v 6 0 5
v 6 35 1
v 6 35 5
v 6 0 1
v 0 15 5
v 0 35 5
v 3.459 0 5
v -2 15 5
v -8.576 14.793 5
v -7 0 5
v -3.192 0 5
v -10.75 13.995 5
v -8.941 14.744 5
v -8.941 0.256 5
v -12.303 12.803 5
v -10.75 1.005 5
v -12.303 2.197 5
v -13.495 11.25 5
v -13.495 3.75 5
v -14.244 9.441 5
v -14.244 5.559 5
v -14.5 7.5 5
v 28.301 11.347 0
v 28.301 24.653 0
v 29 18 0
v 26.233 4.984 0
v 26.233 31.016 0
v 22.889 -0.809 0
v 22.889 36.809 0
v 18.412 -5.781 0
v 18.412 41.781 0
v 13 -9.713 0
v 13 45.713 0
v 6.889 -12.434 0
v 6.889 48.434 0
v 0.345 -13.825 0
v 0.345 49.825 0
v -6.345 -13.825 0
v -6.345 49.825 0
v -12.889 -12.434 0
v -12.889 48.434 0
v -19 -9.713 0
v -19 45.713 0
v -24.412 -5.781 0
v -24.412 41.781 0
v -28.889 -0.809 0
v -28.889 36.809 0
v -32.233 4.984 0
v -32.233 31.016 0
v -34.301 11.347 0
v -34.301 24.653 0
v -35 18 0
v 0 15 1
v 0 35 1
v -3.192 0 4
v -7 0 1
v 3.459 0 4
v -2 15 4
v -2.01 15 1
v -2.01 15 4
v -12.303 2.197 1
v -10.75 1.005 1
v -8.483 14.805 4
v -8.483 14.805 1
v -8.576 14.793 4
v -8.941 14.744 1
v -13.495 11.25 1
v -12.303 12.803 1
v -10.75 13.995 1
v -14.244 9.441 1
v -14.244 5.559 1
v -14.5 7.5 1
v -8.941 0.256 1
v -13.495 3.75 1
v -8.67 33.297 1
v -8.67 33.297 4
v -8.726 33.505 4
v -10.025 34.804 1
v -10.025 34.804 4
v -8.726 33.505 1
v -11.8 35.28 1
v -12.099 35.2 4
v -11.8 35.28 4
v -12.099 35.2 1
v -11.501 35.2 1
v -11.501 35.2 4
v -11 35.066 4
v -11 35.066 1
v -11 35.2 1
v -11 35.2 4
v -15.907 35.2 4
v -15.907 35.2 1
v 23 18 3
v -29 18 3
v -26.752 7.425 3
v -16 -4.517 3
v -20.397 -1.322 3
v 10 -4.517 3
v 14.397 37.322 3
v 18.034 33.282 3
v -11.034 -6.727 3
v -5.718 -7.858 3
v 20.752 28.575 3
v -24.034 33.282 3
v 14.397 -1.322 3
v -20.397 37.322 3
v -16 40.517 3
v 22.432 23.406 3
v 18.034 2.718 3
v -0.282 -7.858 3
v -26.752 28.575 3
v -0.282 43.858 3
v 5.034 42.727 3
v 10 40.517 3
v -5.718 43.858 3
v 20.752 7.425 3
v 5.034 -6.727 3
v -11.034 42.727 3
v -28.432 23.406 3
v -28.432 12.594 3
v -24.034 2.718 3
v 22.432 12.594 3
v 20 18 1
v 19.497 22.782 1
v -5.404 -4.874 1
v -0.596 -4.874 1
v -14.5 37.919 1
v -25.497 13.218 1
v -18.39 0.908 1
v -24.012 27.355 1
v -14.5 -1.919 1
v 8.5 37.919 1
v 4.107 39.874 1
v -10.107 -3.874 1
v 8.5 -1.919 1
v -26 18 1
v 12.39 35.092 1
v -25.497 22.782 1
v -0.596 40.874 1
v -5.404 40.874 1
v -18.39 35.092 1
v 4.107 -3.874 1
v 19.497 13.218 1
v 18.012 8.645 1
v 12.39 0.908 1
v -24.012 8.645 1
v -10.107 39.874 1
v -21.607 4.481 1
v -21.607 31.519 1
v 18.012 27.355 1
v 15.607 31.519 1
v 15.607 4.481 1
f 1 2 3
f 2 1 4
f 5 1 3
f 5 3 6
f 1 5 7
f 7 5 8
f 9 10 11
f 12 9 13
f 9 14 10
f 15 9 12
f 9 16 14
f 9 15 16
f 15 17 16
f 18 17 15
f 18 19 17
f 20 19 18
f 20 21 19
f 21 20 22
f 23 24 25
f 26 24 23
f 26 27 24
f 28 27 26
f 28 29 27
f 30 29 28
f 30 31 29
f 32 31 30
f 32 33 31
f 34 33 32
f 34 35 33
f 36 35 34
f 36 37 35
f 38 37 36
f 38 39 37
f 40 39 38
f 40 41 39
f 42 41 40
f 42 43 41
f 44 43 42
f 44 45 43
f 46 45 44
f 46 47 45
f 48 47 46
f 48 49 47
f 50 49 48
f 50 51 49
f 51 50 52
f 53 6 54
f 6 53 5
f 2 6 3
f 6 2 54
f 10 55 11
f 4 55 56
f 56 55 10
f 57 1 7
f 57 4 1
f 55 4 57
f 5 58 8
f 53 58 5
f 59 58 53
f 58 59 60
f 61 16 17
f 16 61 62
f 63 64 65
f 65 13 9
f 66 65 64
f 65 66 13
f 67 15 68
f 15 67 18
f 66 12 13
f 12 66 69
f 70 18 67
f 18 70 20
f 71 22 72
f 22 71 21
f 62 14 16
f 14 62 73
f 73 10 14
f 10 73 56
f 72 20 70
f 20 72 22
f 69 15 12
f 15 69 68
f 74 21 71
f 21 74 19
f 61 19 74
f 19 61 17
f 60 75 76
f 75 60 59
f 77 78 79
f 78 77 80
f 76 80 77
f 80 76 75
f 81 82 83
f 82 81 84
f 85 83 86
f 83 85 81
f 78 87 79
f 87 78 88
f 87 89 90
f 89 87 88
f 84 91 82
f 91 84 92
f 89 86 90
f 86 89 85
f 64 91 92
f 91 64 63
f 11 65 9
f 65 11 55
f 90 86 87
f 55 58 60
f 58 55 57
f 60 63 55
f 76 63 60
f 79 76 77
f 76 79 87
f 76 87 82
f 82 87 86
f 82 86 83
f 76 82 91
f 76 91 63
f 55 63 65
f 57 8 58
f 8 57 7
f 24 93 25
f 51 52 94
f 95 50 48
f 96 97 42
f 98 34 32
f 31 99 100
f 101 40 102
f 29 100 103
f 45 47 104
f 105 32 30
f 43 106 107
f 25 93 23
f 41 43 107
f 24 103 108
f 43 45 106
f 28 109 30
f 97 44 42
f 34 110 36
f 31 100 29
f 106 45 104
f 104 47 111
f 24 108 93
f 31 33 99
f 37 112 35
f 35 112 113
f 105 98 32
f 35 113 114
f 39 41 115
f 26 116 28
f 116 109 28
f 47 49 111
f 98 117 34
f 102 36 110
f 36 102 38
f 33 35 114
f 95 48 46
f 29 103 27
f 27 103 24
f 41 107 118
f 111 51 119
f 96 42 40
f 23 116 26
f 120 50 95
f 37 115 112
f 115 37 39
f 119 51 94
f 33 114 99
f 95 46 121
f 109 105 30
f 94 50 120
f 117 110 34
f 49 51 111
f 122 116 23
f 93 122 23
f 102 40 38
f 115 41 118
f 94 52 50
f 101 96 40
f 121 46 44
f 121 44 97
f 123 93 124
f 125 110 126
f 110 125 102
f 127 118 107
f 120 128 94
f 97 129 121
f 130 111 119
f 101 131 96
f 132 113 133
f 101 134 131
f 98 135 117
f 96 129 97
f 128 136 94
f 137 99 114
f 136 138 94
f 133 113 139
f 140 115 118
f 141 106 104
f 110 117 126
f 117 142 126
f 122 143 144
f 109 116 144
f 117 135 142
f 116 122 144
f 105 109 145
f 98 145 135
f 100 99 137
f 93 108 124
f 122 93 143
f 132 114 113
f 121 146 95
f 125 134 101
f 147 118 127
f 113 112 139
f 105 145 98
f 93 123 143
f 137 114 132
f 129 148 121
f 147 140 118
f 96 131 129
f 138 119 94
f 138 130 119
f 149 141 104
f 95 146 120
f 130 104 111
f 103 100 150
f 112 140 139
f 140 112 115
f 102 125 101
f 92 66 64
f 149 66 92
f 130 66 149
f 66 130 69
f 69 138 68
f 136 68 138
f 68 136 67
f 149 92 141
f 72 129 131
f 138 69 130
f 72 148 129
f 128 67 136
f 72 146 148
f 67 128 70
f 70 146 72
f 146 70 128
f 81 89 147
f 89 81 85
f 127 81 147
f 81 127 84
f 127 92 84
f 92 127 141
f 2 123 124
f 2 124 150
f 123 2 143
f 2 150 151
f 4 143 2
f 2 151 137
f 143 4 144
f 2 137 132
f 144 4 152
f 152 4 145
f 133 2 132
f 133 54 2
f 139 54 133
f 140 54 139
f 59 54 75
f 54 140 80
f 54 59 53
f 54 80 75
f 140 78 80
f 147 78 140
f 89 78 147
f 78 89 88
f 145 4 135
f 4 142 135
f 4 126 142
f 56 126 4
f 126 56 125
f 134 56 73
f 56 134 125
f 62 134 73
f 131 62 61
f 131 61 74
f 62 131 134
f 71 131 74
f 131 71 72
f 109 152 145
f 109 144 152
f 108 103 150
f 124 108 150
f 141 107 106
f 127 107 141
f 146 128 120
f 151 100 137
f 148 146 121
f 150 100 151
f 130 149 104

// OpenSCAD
difference(){
	union(){
		union(){
			cube(size = [6,35,5], center = false);
			translate([-7,0,0])
			cube(size = [10,15,5]);
			translate([-7,7.5,0])
			cylinder(h = 5, r=7.5);
		}


	difference(){
		union(){
			translate([-4,0,0])
			rotate(20,0,0)
			cube(size = [7,33,5], center = false);
			translate([-11.8,31.73,0])
			cylinder(h = 5, r=3.55);
			translate([-18,30.2,0])
			cube(size = [7,5,5], center = false);
		}
			translate([-12,4,0])
			rotate(20,0,0)
			cube(size = [7,33,5], center = false);
	}
}
	union(){
		translate([0,0,4])
		union(){
			translate([-2.10,-3,0])
			rotate(20,0,0)
			cube(size = [6.25,40,5], center = false);
			translate([-11.8,31.73,0])
			cylinder(h = 5, r=3.55);
			translate([-18,30.3,0])
			cube(size = [7,5,5], center = false);
		}
		
	}
}
translate([-3,18,0])
difference(){
cylinder(h = 3, r1 = 32, r2 = 26);
translate(v = [0,0,+1])
cylinder(h = 2, r1 = 23, r2 =26 );
}



	


	
